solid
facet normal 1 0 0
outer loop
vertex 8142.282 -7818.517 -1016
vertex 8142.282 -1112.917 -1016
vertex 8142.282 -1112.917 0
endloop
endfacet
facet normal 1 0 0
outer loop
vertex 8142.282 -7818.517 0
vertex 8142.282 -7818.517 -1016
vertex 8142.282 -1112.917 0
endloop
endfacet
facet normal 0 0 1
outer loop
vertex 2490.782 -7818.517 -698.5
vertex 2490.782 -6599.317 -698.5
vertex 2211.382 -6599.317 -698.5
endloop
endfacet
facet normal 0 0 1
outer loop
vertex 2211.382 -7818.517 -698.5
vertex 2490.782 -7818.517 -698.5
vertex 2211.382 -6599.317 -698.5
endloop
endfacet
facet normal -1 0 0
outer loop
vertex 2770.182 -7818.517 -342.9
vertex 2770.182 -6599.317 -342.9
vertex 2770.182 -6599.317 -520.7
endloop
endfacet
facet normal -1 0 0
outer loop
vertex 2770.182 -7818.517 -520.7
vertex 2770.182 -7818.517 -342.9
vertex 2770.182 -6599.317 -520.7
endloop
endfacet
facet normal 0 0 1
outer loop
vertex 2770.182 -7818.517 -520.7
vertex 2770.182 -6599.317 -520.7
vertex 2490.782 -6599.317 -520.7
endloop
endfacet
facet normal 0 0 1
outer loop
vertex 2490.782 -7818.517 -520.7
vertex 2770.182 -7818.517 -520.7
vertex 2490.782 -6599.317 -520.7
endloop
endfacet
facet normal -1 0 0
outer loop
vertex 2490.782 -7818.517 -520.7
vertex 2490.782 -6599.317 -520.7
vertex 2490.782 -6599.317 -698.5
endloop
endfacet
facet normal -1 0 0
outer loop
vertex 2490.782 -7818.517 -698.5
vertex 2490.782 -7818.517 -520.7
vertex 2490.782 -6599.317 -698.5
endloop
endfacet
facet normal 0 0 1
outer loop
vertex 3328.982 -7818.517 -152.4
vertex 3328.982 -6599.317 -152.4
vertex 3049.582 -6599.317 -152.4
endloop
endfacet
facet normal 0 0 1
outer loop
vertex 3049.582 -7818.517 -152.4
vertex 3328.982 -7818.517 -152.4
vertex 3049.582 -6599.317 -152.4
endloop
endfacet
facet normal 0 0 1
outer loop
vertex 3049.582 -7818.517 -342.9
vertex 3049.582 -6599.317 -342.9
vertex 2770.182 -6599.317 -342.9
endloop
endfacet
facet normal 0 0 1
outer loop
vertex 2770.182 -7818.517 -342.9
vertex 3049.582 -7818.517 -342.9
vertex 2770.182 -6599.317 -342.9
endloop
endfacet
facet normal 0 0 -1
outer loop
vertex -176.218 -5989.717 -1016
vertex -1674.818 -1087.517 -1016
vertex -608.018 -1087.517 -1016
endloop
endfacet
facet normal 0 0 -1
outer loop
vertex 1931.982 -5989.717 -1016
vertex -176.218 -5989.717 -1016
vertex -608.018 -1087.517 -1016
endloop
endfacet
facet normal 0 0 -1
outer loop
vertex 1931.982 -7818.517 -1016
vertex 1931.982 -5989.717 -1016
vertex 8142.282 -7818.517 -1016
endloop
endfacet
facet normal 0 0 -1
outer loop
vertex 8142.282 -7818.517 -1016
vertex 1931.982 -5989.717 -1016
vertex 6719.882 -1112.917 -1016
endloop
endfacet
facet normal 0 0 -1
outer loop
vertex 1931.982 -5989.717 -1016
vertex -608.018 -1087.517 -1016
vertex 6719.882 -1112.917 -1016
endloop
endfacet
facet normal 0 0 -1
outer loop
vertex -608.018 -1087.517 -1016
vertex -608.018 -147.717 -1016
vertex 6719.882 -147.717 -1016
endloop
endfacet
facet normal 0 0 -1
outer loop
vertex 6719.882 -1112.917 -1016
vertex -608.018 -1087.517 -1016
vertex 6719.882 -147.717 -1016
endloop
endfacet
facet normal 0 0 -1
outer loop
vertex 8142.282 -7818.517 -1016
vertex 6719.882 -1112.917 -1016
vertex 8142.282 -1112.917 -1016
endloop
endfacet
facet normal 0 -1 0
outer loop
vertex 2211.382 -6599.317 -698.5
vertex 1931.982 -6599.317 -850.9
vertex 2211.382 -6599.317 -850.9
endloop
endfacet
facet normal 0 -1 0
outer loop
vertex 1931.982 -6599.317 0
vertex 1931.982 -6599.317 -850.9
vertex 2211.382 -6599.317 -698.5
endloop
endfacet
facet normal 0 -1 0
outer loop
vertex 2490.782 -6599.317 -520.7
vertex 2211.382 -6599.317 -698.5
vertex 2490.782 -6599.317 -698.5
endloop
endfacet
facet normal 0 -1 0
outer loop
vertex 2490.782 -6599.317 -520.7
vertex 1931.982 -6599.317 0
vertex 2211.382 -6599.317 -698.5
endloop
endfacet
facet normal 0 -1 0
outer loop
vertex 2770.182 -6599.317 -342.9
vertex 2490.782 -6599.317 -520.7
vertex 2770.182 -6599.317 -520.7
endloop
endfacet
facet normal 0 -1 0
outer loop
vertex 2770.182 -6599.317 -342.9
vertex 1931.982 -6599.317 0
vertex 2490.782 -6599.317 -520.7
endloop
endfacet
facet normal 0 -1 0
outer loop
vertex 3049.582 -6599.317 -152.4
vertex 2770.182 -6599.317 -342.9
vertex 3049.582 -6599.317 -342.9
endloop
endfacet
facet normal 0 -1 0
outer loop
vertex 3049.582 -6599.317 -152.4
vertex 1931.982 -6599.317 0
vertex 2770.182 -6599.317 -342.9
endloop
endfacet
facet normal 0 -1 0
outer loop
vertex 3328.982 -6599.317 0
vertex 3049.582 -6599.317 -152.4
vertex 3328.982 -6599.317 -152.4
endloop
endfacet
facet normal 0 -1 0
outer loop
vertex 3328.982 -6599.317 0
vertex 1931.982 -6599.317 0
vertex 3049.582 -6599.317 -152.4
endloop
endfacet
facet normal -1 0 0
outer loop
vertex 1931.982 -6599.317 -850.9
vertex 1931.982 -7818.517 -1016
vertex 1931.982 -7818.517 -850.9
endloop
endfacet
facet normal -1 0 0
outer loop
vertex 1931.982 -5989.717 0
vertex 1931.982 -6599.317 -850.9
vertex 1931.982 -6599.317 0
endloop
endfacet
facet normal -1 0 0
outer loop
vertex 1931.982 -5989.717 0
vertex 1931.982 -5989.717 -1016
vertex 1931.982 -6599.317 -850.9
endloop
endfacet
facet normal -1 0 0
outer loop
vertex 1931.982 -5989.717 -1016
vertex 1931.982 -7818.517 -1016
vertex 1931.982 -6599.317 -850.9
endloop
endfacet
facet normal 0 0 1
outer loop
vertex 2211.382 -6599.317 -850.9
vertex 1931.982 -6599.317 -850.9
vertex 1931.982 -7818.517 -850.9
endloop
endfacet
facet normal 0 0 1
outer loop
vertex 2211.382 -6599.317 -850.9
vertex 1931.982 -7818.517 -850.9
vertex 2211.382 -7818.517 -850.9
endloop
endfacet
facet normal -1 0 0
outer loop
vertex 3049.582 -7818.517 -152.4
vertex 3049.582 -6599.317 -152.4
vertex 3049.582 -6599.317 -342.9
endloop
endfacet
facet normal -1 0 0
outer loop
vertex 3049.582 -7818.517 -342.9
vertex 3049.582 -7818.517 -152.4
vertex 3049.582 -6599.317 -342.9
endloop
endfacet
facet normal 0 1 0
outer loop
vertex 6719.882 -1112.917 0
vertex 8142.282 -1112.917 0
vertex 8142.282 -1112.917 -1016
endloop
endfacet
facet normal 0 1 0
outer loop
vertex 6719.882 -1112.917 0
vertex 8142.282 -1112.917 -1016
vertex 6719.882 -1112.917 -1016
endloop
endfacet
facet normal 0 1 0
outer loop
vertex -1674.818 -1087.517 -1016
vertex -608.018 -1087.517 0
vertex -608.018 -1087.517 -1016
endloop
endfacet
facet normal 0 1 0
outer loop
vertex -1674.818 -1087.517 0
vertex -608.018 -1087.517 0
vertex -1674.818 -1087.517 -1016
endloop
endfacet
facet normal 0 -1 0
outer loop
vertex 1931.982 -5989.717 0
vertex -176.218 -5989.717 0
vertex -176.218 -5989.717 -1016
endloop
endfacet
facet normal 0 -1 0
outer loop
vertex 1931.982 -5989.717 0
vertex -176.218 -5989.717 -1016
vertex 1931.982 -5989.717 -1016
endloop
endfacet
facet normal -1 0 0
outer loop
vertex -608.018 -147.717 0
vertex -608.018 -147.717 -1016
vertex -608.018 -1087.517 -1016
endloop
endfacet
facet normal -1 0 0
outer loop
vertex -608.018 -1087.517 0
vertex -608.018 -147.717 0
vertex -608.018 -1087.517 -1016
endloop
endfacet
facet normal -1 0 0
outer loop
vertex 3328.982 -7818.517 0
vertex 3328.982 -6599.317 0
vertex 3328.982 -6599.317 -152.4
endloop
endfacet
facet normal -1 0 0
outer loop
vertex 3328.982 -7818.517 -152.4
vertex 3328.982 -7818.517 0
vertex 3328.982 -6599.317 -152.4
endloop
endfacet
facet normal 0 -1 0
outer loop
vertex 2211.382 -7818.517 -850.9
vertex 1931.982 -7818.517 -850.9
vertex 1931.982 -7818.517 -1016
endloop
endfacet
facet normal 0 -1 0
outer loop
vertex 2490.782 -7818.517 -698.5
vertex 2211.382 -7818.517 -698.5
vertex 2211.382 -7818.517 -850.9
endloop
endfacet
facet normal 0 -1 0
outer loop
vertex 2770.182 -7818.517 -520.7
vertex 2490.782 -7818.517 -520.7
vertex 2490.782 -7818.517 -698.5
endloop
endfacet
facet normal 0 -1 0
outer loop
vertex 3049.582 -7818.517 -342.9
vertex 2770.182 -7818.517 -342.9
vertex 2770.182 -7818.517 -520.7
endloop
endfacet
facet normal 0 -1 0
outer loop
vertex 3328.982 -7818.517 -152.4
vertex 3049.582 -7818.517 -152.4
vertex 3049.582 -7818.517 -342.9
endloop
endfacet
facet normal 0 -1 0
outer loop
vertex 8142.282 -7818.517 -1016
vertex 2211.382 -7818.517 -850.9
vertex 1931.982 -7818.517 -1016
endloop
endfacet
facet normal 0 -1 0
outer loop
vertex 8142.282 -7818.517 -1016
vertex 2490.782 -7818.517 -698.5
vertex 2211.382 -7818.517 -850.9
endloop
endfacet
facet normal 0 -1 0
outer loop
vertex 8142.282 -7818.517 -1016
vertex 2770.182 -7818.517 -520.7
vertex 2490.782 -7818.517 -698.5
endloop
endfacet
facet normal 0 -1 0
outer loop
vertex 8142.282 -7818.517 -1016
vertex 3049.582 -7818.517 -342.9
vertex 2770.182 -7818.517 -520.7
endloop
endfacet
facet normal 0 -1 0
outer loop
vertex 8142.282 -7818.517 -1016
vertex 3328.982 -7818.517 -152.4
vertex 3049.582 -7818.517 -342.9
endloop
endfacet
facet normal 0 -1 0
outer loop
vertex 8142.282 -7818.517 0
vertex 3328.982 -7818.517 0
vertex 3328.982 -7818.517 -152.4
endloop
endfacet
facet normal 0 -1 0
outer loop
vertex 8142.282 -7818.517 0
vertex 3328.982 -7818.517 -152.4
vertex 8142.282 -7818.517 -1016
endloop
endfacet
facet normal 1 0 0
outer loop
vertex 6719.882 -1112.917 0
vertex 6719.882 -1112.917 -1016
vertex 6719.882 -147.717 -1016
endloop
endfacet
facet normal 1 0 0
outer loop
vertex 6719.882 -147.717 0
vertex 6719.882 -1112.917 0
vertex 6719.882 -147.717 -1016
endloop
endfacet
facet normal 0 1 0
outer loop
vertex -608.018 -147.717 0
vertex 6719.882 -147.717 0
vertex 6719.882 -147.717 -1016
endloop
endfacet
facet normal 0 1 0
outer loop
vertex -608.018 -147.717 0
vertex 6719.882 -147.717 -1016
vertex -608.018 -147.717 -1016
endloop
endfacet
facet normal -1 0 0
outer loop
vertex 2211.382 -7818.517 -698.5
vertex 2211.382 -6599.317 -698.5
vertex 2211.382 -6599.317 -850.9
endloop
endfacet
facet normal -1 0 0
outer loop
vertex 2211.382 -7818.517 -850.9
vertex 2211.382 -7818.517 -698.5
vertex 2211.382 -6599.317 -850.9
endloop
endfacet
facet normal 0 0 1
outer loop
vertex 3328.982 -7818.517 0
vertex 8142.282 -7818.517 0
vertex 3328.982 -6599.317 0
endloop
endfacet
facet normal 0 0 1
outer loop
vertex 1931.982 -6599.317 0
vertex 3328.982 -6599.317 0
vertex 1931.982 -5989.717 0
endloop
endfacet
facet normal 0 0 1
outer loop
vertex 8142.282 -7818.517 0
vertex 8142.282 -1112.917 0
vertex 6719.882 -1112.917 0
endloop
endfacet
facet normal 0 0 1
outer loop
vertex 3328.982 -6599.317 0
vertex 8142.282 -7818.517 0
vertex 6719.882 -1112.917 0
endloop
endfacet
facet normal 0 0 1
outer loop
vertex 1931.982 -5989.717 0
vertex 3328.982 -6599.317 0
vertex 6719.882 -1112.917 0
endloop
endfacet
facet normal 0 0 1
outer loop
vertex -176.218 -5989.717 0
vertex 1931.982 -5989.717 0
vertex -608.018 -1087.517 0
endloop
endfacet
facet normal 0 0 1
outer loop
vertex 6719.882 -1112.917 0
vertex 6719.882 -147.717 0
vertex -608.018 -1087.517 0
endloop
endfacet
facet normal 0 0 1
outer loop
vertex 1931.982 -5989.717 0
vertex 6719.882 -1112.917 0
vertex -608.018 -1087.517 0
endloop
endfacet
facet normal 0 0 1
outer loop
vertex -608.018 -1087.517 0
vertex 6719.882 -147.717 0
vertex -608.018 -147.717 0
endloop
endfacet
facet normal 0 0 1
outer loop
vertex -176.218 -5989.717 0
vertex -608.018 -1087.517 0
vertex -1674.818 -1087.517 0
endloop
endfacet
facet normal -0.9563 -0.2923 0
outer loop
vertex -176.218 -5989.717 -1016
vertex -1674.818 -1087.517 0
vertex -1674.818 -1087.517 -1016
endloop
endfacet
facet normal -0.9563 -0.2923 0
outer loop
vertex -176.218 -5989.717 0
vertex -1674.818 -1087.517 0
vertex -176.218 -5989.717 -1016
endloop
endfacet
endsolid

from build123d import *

# Parameters (mm, degrees)
F1_DEPTH = 1016
F2_W     = 279.4
F2_H     = 165.1
F3_DEPTH = 1219.2


with BuildPart() as f1:
    # F0 (on Top) → F1 (new body)
    with BuildSketch(Plane.XY):
        Polygon((6719.881961, -147.716546), (-608.018039, -147.716546), (-608.018039, -1087.516546), (-1674.818039, -1087.516546), (-176.218039, -5989.716546), (1931.981961, -5989.716546), (1931.981961, -6599.316546), (8142.281961, -6599.316546), (8142.281961, -1112.916546), (6719.881961, -1112.916546), align=None)
    extrude(amount=-F1_DEPTH)

    # F2 (on face) → F3 (join)
    with BuildSketch(Plane.XZ.offset(6599.316546)):
        Polygon((8142.281961, -1016), (8142.281961, 0), (3328.981961, 0), (3328.981961, -152.4), (3328.981961, -1016), align=None)
        Polygon((3328.981961, -1016), (3328.981961, -152.4), (3049.581961, -152.4), (3049.581961, -342.9), (3049.581961, -1016), align=None)
        Polygon((2770.181961, -1016), (3049.581961, -1016), (3049.581961, -342.9), (2770.181961, -342.9), (2770.181961, -520.7), align=None)
        Polygon((2490.781961, -1016), (2770.181961, -1016), (2770.181961, -520.7), (2490.781961, -520.7), (2490.781961, -698.5), align=None)
        Polygon((2211.381961, -1016), (2490.781961, -1016), (2490.781961, -698.5), (2211.381961, -698.5), (2211.381961, -850.9), align=None)
        with Locations((2071.681961, -933.45)):
            Rectangle(F2_W, F2_H)
    extrude(amount=F3_DEPTH)


solid = f1.part
